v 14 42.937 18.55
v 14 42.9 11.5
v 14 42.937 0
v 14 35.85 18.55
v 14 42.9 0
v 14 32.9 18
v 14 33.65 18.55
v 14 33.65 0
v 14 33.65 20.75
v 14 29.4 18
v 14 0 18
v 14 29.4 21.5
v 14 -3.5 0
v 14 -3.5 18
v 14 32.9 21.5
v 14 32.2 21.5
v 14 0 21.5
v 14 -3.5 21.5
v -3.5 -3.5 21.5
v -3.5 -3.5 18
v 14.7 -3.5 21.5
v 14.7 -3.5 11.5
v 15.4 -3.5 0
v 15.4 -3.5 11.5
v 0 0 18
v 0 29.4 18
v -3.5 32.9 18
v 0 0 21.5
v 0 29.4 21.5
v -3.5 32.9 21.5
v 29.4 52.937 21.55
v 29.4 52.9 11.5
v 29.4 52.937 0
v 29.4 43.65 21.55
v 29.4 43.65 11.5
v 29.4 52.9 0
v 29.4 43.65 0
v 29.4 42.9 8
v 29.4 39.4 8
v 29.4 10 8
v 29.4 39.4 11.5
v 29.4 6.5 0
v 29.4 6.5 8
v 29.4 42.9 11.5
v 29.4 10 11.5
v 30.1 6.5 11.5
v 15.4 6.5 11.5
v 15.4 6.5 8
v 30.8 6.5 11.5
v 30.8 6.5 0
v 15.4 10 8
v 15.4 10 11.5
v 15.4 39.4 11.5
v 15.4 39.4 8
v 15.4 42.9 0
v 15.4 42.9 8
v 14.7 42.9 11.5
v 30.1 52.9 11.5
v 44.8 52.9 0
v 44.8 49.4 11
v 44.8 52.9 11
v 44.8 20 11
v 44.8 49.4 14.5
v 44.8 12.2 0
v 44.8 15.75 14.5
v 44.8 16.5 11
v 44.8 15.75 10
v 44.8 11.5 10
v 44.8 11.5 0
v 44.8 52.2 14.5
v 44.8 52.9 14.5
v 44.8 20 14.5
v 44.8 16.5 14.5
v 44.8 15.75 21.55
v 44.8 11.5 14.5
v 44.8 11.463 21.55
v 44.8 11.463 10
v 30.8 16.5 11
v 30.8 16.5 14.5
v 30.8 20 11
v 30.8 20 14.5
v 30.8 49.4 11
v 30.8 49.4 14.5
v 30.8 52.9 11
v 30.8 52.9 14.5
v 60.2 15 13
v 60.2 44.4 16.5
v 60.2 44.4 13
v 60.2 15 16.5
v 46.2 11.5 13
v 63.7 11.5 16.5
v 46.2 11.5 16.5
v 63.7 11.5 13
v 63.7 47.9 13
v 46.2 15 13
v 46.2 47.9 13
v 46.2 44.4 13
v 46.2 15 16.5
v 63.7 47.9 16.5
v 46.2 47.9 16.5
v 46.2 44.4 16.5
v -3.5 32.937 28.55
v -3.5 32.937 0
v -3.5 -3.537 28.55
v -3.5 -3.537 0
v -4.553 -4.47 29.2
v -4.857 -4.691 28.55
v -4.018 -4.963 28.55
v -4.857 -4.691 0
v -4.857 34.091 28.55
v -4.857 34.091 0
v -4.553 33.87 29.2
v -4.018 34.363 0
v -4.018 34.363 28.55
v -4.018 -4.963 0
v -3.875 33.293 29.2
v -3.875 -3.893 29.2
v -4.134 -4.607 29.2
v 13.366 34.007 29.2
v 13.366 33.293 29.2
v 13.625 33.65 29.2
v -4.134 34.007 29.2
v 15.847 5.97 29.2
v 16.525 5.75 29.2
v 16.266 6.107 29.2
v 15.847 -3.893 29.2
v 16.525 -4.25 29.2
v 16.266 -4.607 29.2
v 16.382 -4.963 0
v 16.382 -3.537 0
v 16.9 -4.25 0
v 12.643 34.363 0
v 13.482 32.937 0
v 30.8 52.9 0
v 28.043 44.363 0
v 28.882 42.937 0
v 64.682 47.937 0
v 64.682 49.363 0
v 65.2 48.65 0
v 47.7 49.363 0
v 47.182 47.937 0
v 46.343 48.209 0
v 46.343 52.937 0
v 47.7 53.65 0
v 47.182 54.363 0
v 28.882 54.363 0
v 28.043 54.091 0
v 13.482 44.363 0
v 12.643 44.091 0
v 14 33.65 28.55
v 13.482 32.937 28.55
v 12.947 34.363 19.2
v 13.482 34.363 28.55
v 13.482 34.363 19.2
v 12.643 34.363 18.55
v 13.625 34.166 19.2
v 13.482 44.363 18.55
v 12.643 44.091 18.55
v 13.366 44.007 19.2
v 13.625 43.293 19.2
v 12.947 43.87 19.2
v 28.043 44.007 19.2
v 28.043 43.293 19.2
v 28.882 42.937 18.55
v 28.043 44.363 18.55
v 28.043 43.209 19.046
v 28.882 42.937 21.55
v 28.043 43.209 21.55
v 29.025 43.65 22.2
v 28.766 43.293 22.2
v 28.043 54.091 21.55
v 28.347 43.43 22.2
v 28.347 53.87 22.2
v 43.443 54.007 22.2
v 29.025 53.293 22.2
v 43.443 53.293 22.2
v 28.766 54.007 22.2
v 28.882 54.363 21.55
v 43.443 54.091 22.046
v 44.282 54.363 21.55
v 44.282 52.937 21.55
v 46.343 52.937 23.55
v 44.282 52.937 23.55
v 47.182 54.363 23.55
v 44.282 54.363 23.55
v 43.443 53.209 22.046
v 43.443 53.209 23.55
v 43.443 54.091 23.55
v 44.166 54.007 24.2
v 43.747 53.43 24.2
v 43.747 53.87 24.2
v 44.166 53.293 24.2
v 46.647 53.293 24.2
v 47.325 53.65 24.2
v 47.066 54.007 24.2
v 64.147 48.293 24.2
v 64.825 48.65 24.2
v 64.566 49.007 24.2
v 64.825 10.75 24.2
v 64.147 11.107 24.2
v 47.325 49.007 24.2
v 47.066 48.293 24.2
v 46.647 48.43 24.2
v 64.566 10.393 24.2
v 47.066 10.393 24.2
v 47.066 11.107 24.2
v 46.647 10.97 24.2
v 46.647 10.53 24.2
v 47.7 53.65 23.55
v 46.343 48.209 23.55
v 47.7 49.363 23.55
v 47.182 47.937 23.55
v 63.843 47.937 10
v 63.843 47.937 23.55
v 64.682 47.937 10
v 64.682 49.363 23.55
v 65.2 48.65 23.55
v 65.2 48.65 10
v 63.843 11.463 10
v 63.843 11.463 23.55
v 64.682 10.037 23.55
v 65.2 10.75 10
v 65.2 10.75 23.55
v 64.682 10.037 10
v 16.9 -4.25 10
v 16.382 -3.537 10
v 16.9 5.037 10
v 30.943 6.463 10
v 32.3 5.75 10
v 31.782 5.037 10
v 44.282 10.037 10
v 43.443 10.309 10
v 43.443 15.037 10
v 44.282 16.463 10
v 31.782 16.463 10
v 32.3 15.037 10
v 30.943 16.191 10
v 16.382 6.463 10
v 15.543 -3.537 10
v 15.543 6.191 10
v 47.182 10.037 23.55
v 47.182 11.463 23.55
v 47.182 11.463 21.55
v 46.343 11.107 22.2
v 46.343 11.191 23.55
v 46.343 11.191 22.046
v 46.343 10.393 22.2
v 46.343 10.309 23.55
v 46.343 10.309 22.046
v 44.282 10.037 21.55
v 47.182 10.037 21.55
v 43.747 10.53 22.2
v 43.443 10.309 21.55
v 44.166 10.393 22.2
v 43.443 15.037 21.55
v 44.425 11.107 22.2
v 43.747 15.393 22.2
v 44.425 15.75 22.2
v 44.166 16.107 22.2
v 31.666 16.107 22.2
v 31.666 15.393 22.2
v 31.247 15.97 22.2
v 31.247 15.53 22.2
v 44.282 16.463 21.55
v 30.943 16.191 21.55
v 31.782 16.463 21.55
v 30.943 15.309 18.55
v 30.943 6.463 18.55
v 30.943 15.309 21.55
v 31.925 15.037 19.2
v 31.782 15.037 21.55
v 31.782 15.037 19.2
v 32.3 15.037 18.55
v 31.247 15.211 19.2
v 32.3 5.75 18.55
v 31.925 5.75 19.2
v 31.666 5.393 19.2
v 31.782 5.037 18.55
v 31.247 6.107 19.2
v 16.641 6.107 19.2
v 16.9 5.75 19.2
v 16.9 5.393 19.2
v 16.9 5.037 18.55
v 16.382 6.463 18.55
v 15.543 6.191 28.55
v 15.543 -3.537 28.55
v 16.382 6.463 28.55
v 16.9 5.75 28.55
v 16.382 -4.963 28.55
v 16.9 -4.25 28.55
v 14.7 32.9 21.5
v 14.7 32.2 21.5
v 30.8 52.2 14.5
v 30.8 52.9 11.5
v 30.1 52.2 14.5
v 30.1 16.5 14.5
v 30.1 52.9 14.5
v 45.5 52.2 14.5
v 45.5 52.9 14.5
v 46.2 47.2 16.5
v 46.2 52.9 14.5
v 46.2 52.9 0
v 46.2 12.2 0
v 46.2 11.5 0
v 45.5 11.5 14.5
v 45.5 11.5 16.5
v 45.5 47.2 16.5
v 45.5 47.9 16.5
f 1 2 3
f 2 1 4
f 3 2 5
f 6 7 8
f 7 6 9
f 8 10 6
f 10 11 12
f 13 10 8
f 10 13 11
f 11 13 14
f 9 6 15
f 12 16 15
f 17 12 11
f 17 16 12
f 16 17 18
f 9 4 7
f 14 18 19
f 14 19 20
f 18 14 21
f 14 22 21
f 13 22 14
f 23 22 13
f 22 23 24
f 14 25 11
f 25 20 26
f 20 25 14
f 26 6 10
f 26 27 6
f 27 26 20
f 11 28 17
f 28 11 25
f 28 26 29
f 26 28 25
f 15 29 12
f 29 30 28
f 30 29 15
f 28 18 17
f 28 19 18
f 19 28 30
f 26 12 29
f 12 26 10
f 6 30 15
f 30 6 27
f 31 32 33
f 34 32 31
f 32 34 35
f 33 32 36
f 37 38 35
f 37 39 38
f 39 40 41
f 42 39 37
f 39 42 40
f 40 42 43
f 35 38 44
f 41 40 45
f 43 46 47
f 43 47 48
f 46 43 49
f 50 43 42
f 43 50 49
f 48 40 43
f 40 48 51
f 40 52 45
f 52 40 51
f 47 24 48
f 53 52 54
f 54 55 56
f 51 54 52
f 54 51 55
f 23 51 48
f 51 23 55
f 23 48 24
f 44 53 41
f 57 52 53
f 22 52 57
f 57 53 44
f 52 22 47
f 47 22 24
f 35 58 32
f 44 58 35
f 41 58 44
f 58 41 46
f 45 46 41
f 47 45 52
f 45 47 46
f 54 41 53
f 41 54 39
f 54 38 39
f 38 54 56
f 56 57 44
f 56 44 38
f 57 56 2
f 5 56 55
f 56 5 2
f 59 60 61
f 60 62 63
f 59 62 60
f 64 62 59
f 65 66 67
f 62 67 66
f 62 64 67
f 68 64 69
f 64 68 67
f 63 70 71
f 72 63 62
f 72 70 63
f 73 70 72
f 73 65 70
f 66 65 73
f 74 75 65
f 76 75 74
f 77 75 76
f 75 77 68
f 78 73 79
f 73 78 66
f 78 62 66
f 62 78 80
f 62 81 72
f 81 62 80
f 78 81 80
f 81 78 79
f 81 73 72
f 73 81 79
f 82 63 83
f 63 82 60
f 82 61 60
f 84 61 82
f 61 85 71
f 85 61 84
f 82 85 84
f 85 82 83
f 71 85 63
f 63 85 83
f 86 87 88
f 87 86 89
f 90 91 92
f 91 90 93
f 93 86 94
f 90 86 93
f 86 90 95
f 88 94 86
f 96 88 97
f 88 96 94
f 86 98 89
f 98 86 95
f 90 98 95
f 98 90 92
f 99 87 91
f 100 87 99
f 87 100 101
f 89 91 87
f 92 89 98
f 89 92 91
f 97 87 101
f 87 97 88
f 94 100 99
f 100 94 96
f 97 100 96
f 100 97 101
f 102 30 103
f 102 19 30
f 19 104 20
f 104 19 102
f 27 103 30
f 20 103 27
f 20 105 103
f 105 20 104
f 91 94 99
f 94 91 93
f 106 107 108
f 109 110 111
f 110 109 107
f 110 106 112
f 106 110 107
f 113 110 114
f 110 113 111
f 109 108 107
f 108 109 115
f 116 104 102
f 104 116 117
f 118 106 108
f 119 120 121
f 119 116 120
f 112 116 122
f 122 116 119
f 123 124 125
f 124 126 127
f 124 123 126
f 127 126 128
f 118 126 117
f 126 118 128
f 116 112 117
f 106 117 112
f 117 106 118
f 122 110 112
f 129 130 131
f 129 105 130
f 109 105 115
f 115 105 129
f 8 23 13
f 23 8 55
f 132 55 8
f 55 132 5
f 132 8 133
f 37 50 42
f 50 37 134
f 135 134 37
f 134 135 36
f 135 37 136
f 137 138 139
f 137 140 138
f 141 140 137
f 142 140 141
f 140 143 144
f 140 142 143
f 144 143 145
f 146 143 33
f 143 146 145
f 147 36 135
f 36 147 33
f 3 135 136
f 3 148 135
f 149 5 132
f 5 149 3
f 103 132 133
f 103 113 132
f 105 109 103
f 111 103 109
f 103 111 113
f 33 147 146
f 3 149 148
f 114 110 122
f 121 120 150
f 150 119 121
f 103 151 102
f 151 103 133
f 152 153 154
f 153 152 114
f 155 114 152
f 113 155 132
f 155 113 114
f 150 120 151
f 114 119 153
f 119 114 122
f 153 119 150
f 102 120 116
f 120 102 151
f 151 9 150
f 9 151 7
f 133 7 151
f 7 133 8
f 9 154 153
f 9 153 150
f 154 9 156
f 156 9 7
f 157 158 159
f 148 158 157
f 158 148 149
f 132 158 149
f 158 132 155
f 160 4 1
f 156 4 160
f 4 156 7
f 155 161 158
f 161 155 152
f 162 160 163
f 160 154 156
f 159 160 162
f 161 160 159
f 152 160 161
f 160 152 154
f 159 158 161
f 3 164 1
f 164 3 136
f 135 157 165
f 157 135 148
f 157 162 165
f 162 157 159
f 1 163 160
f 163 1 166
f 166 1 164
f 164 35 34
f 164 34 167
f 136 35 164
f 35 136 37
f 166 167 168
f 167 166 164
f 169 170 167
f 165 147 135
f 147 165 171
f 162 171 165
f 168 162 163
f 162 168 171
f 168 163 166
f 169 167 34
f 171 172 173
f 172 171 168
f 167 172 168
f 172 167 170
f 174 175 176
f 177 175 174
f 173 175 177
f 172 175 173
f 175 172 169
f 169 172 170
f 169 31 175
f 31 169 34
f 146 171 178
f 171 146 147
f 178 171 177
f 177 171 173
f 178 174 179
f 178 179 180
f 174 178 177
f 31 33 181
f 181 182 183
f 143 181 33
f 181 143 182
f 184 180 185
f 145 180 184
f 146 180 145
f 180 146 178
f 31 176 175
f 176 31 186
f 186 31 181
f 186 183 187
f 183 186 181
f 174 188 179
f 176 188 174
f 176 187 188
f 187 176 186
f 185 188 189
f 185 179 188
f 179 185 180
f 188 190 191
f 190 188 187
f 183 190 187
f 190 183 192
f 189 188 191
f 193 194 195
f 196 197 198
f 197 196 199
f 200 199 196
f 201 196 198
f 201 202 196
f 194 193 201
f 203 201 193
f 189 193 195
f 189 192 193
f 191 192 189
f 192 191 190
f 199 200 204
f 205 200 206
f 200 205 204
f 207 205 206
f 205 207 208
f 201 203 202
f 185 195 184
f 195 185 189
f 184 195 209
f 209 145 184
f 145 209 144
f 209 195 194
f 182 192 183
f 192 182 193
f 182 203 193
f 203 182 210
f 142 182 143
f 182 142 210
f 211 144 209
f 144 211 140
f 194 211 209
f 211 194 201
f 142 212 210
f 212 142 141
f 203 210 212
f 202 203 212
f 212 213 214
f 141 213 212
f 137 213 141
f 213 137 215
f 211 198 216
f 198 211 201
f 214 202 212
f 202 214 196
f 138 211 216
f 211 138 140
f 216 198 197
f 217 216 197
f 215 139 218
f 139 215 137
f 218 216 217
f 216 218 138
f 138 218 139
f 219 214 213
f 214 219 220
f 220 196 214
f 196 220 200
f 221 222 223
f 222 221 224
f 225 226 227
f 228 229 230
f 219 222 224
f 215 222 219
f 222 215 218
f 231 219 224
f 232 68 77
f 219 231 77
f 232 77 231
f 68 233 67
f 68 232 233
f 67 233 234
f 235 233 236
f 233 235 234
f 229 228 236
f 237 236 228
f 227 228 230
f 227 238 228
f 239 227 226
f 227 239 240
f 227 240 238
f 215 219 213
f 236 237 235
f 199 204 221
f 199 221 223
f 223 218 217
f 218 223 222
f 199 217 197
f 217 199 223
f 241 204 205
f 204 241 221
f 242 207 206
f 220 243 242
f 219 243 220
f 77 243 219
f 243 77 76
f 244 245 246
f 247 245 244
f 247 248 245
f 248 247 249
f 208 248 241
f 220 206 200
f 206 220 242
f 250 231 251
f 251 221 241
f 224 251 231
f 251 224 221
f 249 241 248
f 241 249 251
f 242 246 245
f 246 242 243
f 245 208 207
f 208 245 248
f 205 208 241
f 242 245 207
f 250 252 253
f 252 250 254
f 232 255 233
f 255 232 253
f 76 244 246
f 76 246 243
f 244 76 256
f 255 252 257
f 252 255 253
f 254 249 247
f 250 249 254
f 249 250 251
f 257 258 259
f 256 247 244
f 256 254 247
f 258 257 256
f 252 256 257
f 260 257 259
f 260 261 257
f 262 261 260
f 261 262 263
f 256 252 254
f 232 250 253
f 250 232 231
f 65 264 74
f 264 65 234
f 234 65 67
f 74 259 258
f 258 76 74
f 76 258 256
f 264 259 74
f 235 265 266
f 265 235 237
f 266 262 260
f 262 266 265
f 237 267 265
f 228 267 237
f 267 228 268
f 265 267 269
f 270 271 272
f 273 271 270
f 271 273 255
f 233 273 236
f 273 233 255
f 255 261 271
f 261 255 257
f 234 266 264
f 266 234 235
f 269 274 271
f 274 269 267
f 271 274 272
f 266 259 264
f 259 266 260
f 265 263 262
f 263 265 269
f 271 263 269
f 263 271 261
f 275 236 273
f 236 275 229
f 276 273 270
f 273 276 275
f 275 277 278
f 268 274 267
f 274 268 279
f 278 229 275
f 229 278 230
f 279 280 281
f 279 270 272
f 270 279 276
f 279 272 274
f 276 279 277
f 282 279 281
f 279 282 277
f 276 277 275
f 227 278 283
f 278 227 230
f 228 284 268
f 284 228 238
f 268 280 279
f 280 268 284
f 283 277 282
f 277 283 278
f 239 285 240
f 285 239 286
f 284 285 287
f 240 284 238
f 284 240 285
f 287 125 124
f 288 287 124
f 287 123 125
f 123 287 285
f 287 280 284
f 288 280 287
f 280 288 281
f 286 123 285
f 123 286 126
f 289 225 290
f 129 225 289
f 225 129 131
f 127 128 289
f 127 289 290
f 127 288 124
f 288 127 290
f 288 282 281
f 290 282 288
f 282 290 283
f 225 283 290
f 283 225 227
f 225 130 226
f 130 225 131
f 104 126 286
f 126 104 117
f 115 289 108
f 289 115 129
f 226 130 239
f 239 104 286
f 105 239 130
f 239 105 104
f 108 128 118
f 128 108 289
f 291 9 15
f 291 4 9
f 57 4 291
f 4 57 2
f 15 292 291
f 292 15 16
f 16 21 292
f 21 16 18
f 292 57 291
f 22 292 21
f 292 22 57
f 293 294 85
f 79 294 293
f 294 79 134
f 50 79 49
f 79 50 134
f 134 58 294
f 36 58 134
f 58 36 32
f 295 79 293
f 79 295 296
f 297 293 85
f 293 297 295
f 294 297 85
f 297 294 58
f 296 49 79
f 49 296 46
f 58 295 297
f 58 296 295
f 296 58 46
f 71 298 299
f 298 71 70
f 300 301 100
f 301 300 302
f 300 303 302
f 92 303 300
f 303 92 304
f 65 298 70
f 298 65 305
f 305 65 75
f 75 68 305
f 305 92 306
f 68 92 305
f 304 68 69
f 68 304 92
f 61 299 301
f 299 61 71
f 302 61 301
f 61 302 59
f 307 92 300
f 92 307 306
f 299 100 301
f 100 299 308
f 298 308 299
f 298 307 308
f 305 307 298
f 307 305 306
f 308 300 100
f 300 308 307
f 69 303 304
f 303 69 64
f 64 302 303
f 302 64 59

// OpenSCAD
$fn=5;
union()
{
	union()
	{
		hull()
		{
			translate([-3.5,-3.5,18])
			{
				rotate(0,[0,0,1])
				{
					cube([3.5,3.5,3.5]);
				}
			}
			translate([-3.5,29.400002,18])
			{
				rotate(0,[0,0,1])
				{
					cube([3.5,3.5,3.5]);
				}
			}
		}
		union()
		{
			hull()
			{
				translate([0,-3.5,18])
				{
					rotate(0,[0,0,1])
					{
						cube([3.5,3.5,3.5]);
					}
				}
				translate([10.5,-3.5,18])
				{
					rotate(0,[0,0,1])
					{
						cube([3.5,3.5,3.5]);
					}
				}
			}
			hull()
			{
				translate([0,29.400002,18])
				{
					rotate(0,[0,0,1])
					{
						cube([3.5,3.5,3.5]);
					}
				}
				translate([10.5,29.400002,18])
				{
					rotate(0,[0,0,1])
					{
						cube([3.5,3.5,3.5]);
					}
				}
			}
		}
		union()
		{
			hull()
			{
				translate([15.4,6.5,8])
				{
					rotate(0,[0,0,1])
					{
						cube([3.5,3.5,3.5]);
					}
				}
				translate([25.9,6.5,8])
				{
					rotate(0,[0,0,1])
					{
						cube([3.5,3.5,3.5]);
					}
				}
			}
			hull()
			{
				translate([15.4,39.4,8])
				{
					rotate(0,[0,0,1])
					{
						cube([3.5,3.5,3.5]);
					}
				}
				translate([25.9,39.4,8])
				{
					rotate(0,[0,0,1])
					{
						cube([3.5,3.5,3.5]);
					}
				}
			}
		}
		union()
		{
			hull()
			{
				translate([30.8,16.5,11])
				{
					rotate(0,[0,0,1])
					{
						cube([3.5,3.5,3.5]);
					}
				}
				translate([41.3,16.5,11])
				{
					rotate(0,[0,0,1])
					{
						cube([3.5,3.5,3.5]);
					}
				}
			}
			hull()
			{
				translate([30.8,49.4,11])
				{
					rotate(0,[0,0,1])
					{
						cube([3.5,3.5,3.5]);
					}
				}
				translate([41.3,49.4,11])
				{
					rotate(0,[0,0,1])
					{
						cube([3.5,3.5,3.5]);
					}
				}
			}
		}
		union()
		{
			hull()
			{
				translate([46.199997,11.5,13])
				{
					rotate(0,[0,0,1])
					{
						cube([3.5,3.5,3.5]);
					}
				}
				translate([56.699997,11.5,13])
				{
					rotate(0,[0,0,1])
					{
						cube([3.5,3.5,3.5]);
					}
				}
			}
			hull()
			{
				translate([46.199997,44.4,13])
				{
					rotate(0,[0,0,1])
					{
						cube([3.5,3.5,3.5]);
					}
				}
				translate([56.699997,44.4,13])
				{
					rotate(0,[0,0,1])
					{
						cube([3.5,3.5,3.5]);
					}
				}
			}
		}
		hull()
		{
			translate([60.199997,11.5,13])
			{
				rotate(0,[0,0,1])
				{
					cube([3.5,3.5,3.5]);
				}
			}
			translate([60.199997,44.4,13])
			{
				rotate(0,[0,0,1])
				{
					cube([3.5,3.5,3.5]);
				}
			}
		}
	}
	union()
	{
		hull()
		{
			hull()
			{
				translate([-4.25,-4.25,0])
				{
					rotate(0,[0,0,1])
					{
						cylinder(h=1.5,d=1.5);
					}
				}
				translate([-4.25,-4.25,28.55])
				{
					rotate(0,[0,0,1])
					{
						sphere(d=1.5);
					}
				}
			}
			hull()
			{
				translate([-4.25,33.65,0])
				{
					rotate(0,[0,0,1])
					{
						cylinder(h=1.5,d=1.5);
					}
				}
				translate([-4.25,33.65,28.55])
				{
					rotate(0,[0,0,1])
					{
						sphere(d=1.5);
					}
				}
			}
		}
		hull()
		{
			hull()
			{
				translate([-4.25,33.65,0])
				{
					rotate(0,[0,0,1])
					{
						cylinder(h=1.5,d=1.5);
					}
				}
				translate([-4.25,33.65,28.55])
				{
					rotate(0,[0,0,1])
					{
						sphere(d=1.5);
					}
				}
			}
			hull()
			{
				translate([13.25,33.65,0])
				{
					rotate(0,[0,0,1])
					{
						cylinder(h=1.5,d=1.5);
					}
				}
				translate([13.25,33.65,28.55])
				{
					rotate(0,[0,0,1])
					{
						sphere(d=1.5);
					}
				}
			}
		}
		hull()
		{
			hull()
			{
				translate([13.25,33.65,0])
				{
					rotate(0,[0,0,1])
					{
						cylinder(h=1.5,d=1.5);
					}
				}
				translate([13.25,33.65,28.55])
				{
					rotate(0,[0,0,1])
					{
						sphere(d=1.5);
					}
				}
			}
			hull()
			{
				translate([13.25,33.65,0])
				{
					rotate(0,[0,0,1])
					{
						cylinder(h=1.5,d=1.5);
					}
				}
				translate([13.25,33.65,18.55])
				{
					rotate(0,[0,0,1])
					{
						sphere(d=1.5);
					}
				}
			}
		}
		hull()
		{
			hull()
			{
				translate([13.25,33.65,0])
				{
					rotate(0,[0,0,1])
					{
						cylinder(h=1.5,d=1.5);
					}
				}
				translate([13.25,33.65,18.55])
				{
					rotate(0,[0,0,1])
					{
						sphere(d=1.5);
					}
				}
			}
			hull()
			{
				translate([13.25,43.65,0])
				{
					rotate(0,[0,0,1])
					{
						cylinder(h=1.5,d=1.5);
					}
				}
				translate([13.25,43.65,18.55])
				{
					rotate(0,[0,0,1])
					{
						sphere(d=1.5);
					}
				}
			}
		}
		hull()
		{
			hull()
			{
				translate([13.25,43.65,0])
				{
					rotate(0,[0,0,1])
					{
						cylinder(h=1.5,d=1.5);
					}
				}
				translate([13.25,43.65,18.55])
				{
					rotate(0,[0,0,1])
					{
						sphere(d=1.5);
					}
				}
			}
			hull()
			{
				translate([16.15,43.65,0])
				{
					rotate(0,[0,0,1])
					{
						cylinder(h=1.5,d=1.5);
					}
				}
				translate([16.15,43.65,18.55])
				{
					rotate(0,[0,0,1])
					{
						sphere(d=1.5);
					}
				}
			}
		}
		hull()
		{
			hull()
			{
				translate([16.15,43.65,0])
				{
					rotate(0,[0,0,1])
					{
						cylinder(h=1.5,d=1.5);
					}
				}
				translate([16.15,43.65,18.55])
				{
					rotate(0,[0,0,1])
					{
						sphere(d=1.5);
					}
				}
			}
			hull()
			{
				translate([28.65,43.65,0])
				{
					rotate(0,[0,0,1])
					{
						cylinder(h=1.5,d=1.5);
					}
				}
				translate([28.65,43.65,18.55])
				{
					rotate(0,[0,0,1])
					{
						sphere(d=1.5);
					}
				}
			}
		}
		hull()
		{
			hull()
			{
				translate([28.65,43.65,0])
				{
					rotate(0,[0,0,1])
					{
						cylinder(h=1.5,d=1.5);
					}
				}
				translate([28.65,43.65,18.55])
				{
					rotate(0,[0,0,1])
					{
						sphere(d=1.5);
					}
				}
			}
			hull()
			{
				translate([28.65,43.65,0])
				{
					rotate(0,[0,0,1])
					{
						cylinder(h=1.5,d=1.5);
					}
				}
				translate([28.65,43.65,21.55])
				{
					rotate(0,[0,0,1])
					{
						sphere(d=1.5);
					}
				}
			}
		}
		hull()
		{
			hull()
			{
				translate([28.65,43.65,0])
				{
					rotate(0,[0,0,1])
					{
						cylinder(h=1.5,d=1.5);
					}
				}
				translate([28.65,43.65,21.55])
				{
					rotate(0,[0,0,1])
					{
						sphere(d=1.5);
					}
				}
			}
			hull()
			{
				translate([28.65,53.65,0])
				{
					rotate(0,[0,0,1])
					{
						cylinder(h=1.5,d=1.5);
					}
				}
				translate([28.65,53.65,21.55])
				{
					rotate(0,[0,0,1])
					{
						sphere(d=1.5);
					}
				}
			}
		}
		hull()
		{
			hull()
			{
				translate([28.65,53.65,0])
				{
					rotate(0,[0,0,1])
					{
						cylinder(h=1.5,d=1.5);
					}
				}
				translate([28.65,53.65,21.55])
				{
					rotate(0,[0,0,1])
					{
						sphere(d=1.5);
					}
				}
			}
			hull()
			{
				translate([31.55,53.65,0])
				{
					rotate(0,[0,0,1])
					{
						cylinder(h=1.5,d=1.5);
					}
				}
				translate([31.55,53.65,21.55])
				{
					rotate(0,[0,0,1])
					{
						sphere(d=1.5);
					}
				}
			}
		}
		hull()
		{
			hull()
			{
				translate([31.55,53.65,0])
				{
					rotate(0,[0,0,1])
					{
						cylinder(h=1.5,d=1.5);
					}
				}
				translate([31.55,53.65,21.55])
				{
					rotate(0,[0,0,1])
					{
						sphere(d=1.5);
					}
				}
			}
			hull()
			{
				translate([44.05,53.65,0])
				{
					rotate(0,[0,0,1])
					{
						cylinder(h=1.5,d=1.5);
					}
				}
				translate([44.05,53.65,21.55])
				{
					rotate(0,[0,0,1])
					{
						sphere(d=1.5);
					}
				}
			}
		}
		hull()
		{
			hull()
			{
				translate([44.05,53.65,0])
				{
					rotate(0,[0,0,1])
					{
						cylinder(h=1.5,d=1.5);
					}
				}
				translate([44.05,53.65,21.55])
				{
					rotate(0,[0,0,1])
					{
						sphere(d=1.5);
					}
				}
			}
			hull()
			{
				translate([44.05,53.65,0])
				{
					rotate(0,[0,0,1])
					{
						cylinder(h=1.5,d=1.5);
					}
				}
				translate([44.05,53.65,23.55])
				{
					rotate(0,[0,0,1])
					{
						sphere(d=1.5);
					}
				}
			}
		}
		hull()
		{
			hull()
			{
				translate([44.05,53.65,0])
				{
					rotate(0,[0,0,1])
					{
						cylinder(h=1.5,d=1.5);
					}
				}
				translate([44.05,53.65,23.55])
				{
					rotate(0,[0,0,1])
					{
						sphere(d=1.5);
					}
				}
			}
			hull()
			{
				translate([46.949997,53.65,0])
				{
					rotate(0,[0,0,1])
					{
						cylinder(h=1.5,d=1.5);
					}
				}
				translate([46.949997,53.65,23.55])
				{
					rotate(0,[0,0,1])
					{
						sphere(d=1.5);
					}
				}
			}
		}
		hull()
		{
			hull()
			{
				translate([46.949997,53.65,0])
				{
					rotate(0,[0,0,1])
					{
						cylinder(h=1.5,d=1.5);
					}
				}
				translate([46.949997,53.65,23.55])
				{
					rotate(0,[0,0,1])
					{
						sphere(d=1.5);
					}
				}
			}
			hull()
			{
				translate([46.949997,48.65,0])
				{
					rotate(0,[0,0,1])
					{
						cylinder(h=1.5,d=1.5);
					}
				}
				translate([46.949997,48.65,23.55])
				{
					rotate(0,[0,0,1])
					{
						sphere(d=1.5);
					}
				}
			}
		}
		hull()
		{
			hull()
			{
				translate([46.949997,48.65,0])
				{
					rotate(0,[0,0,1])
					{
						cylinder(h=1.5,d=1.5);
					}
				}
				translate([46.949997,48.65,23.55])
				{
					rotate(0,[0,0,1])
					{
						sphere(d=1.5);
					}
				}
			}
			hull()
			{
				translate([64.45,48.65,0])
				{
					rotate(0,[0,0,1])
					{
						cylinder(h=1.5,d=1.5);
					}
				}
				translate([64.45,48.65,23.55])
				{
					rotate(0,[0,0,1])
					{
						sphere(d=1.5);
					}
				}
			}
		}
		hull()
		{
			hull()
			{
				translate([64.45,48.65,0])
				{
					rotate(0,[0,0,1])
					{
						cylinder(h=1.5,d=1.5);
					}
				}
				translate([64.45,48.65,23.55])
				{
					rotate(0,[0,0,1])
					{
						sphere(d=1.5);
					}
				}
			}
			hull()
			{
				translate([64.45,48.65,10])
				{
					rotate(0,[0,0,1])
					{
						cylinder(h=1.5,d=1.5);
					}
				}
				translate([64.45,48.65,23.55])
				{
					rotate(0,[0,0,1])
					{
						sphere(d=1.5);
					}
				}
			}
		}
		hull()
		{
			hull()
			{
				translate([64.45,48.65,10])
				{
					rotate(0,[0,0,1])
					{
						cylinder(h=1.5,d=1.5);
					}
				}
				translate([64.45,48.65,23.55])
				{
					rotate(0,[0,0,1])
					{
						sphere(d=1.5);
					}
				}
			}
			hull()
			{
				translate([64.45,10.75,10])
				{
					rotate(0,[0,0,1])
					{
						cylinder(h=1.5,d=1.5);
					}
				}
				translate([64.45,10.75,23.55])
				{
					rotate(0,[0,0,1])
					{
						sphere(d=1.5);
					}
				}
			}
		}
		hull()
		{
			hull()
			{
				translate([64.45,10.75,10])
				{
					rotate(0,[0,0,1])
					{
						cylinder(h=1.5,d=1.5);
					}
				}
				translate([64.45,10.75,23.55])
				{
					rotate(0,[0,0,1])
					{
						sphere(d=1.5);
					}
				}
			}
			hull()
			{
				translate([46.949997,10.75,10])
				{
					rotate(0,[0,0,1])
					{
						cylinder(h=1.5,d=1.5);
					}
				}
				translate([46.949997,10.75,23.55])
				{
					rotate(0,[0,0,1])
					{
						sphere(d=1.5);
					}
				}
			}
		}
		hull()
		{
			hull()
			{
				translate([46.949997,10.75,10])
				{
					rotate(0,[0,0,1])
					{
						cylinder(h=1.5,d=1.5);
					}
				}
				translate([46.949997,10.75,23.55])
				{
					rotate(0,[0,0,1])
					{
						sphere(d=1.5);
					}
				}
			}
			hull()
			{
				translate([46.949997,10.75,10])
				{
					rotate(0,[0,0,1])
					{
						cylinder(h=1.5,d=1.5);
					}
				}
				translate([46.949997,10.75,21.55])
				{
					rotate(0,[0,0,1])
					{
						sphere(d=1.5);
					}
				}
			}
		}
		hull()
		{
			hull()
			{
				translate([46.949997,10.75,10])
				{
					rotate(0,[0,0,1])
					{
						cylinder(h=1.5,d=1.5);
					}
				}
				translate([46.949997,10.75,21.55])
				{
					rotate(0,[0,0,1])
					{
						sphere(d=1.5);
					}
				}
			}
			hull()
			{
				translate([44.05,10.75,10])
				{
					rotate(0,[0,0,1])
					{
						cylinder(h=1.5,d=1.5);
					}
				}
				translate([44.05,10.75,21.55])
				{
					rotate(0,[0,0,1])
					{
						sphere(d=1.5);
					}
				}
			}
		}
		hull()
		{
			hull()
			{
				translate([44.05,10.75,10])
				{
					rotate(0,[0,0,1])
					{
						cylinder(h=1.5,d=1.5);
					}
				}
				translate([44.05,10.75,21.55])
				{
					rotate(0,[0,0,1])
					{
						sphere(d=1.5);
					}
				}
			}
			hull()
			{
				translate([44.05,15.75,10])
				{
					rotate(0,[0,0,1])
					{
						cylinder(h=1.5,d=1.5);
					}
				}
				translate([44.05,15.75,21.55])
				{
					rotate(0,[0,0,1])
					{
						sphere(d=1.5);
					}
				}
			}
		}
		hull()
		{
			hull()
			{
				translate([44.05,15.75,10])
				{
					rotate(0,[0,0,1])
					{
						cylinder(h=1.5,d=1.5);
					}
				}
				translate([44.05,15.75,21.55])
				{
					rotate(0,[0,0,1])
					{
						sphere(d=1.5);
					}
				}
			}
			hull()
			{
				translate([31.55,15.75,10])
				{
					rotate(0,[0,0,1])
					{
						cylinder(h=1.5,d=1.5);
					}
				}
				translate([31.55,15.75,21.55])
				{
					rotate(0,[0,0,1])
					{
						sphere(d=1.5);
					}
				}
			}
		}
		hull()
		{
			hull()
			{
				translate([31.55,15.75,10])
				{
					rotate(0,[0,0,1])
					{
						cylinder(h=1.5,d=1.5);
					}
				}
				translate([31.55,15.75,21.55])
				{
					rotate(0,[0,0,1])
					{
						sphere(d=1.5);
					}
				}
			}
			hull()
			{
				translate([31.55,15.75,10])
				{
					rotate(0,[0,0,1])
					{
						cylinder(h=1.5,d=1.5);
					}
				}
				translate([31.55,15.75,18.55])
				{
					rotate(0,[0,0,1])
					{
						sphere(d=1.5);
					}
				}
			}
		}
		hull()
		{
			hull()
			{
				translate([31.55,15.75,10])
				{
					rotate(0,[0,0,1])
					{
						cylinder(h=1.5,d=1.5);
					}
				}
				translate([31.55,15.75,18.55])
				{
					rotate(0,[0,0,1])
					{
						sphere(d=1.5);
					}
				}
			}
			hull()
			{
				translate([31.55,5.75,10])
				{
					rotate(0,[0,0,1])
					{
						cylinder(h=1.5,d=1.5);
					}
				}
				translate([31.55,5.75,18.55])
				{
					rotate(0,[0,0,1])
					{
						sphere(d=1.5);
					}
				}
			}
		}
		hull()
		{
			hull()
			{
				translate([31.55,5.75,10])
				{
					rotate(0,[0,0,1])
					{
						cylinder(h=1.5,d=1.5);
					}
				}
				translate([31.55,5.75,18.55])
				{
					rotate(0,[0,0,1])
					{
						sphere(d=1.5);
					}
				}
			}
			hull()
			{
				translate([28.65,5.75,10])
				{
					rotate(0,[0,0,1])
					{
						cylinder(h=1.5,d=1.5);
					}
				}
				translate([28.65,5.75,18.55])
				{
					rotate(0,[0,0,1])
					{
						sphere(d=1.5);
					}
				}
			}
		}
		hull()
		{
			hull()
			{
				translate([28.65,5.75,10])
				{
					rotate(0,[0,0,1])
					{
						cylinder(h=1.5,d=1.5);
					}
				}
				translate([28.65,5.75,18.55])
				{
					rotate(0,[0,0,1])
					{
						sphere(d=1.5);
					}
				}
			}
			hull()
			{
				translate([16.15,5.75,10])
				{
					rotate(0,[0,0,1])
					{
						cylinder(h=1.5,d=1.5);
					}
				}
				translate([16.15,5.75,18.55])
				{
					rotate(0,[0,0,1])
					{
						sphere(d=1.5);
					}
				}
			}
		}
		hull()
		{
			hull()
			{
				translate([16.15,5.75,10])
				{
					rotate(0,[0,0,1])
					{
						cylinder(h=1.5,d=1.5);
					}
				}
				translate([16.15,5.75,18.55])
				{
					rotate(0,[0,0,1])
					{
						sphere(d=1.5);
					}
				}
			}
			hull()
			{
				translate([16.15,5.75,10])
				{
					rotate(0,[0,0,1])
					{
						cylinder(h=1.5,d=1.5);
					}
				}
				translate([16.15,5.75,28.55])
				{
					rotate(0,[0,0,1])
					{
						sphere(d=1.5);
					}
				}
			}
		}
		hull()
		{
			hull()
			{
				translate([16.15,5.75,10])
				{
					rotate(0,[0,0,1])
					{
						cylinder(h=1.5,d=1.5);
					}
				}
				translate([16.15,5.75,28.55])
				{
					rotate(0,[0,0,1])
					{
						sphere(d=1.5);
					}
				}
			}
			hull()
			{
				translate([16.15,-4.25,10])
				{
					rotate(0,[0,0,1])
					{
						cylinder(h=1.5,d=1.5);
					}
				}
				translate([16.15,-4.25,28.55])
				{
					rotate(0,[0,0,1])
					{
						sphere(d=1.5);
					}
				}
			}
		}
		hull()
		{
			hull()
			{
				translate([16.15,-4.25,10])
				{
					rotate(0,[0,0,1])
					{
						cylinder(h=1.5,d=1.5);
					}
				}
				translate([16.15,-4.25,28.55])
				{
					rotate(0,[0,0,1])
					{
						sphere(d=1.5);
					}
				}
			}
			hull()
			{
				translate([16.15,-4.25,0])
				{
					rotate(0,[0,0,1])
					{
						cylinder(h=1.5,d=1.5);
					}
				}
				translate([16.15,-4.25,28.55])
				{
					rotate(0,[0,0,1])
					{
						sphere(d=1.5);
					}
				}
			}
		}
		hull()
		{
			hull()
			{
				translate([16.15,-4.25,0])
				{
					rotate(0,[0,0,1])
					{
						cylinder(h=1.5,d=1.5);
					}
				}
				translate([16.15,-4.25,28.55])
				{
					rotate(0,[0,0,1])
					{
						sphere(d=1.5);
					}
				}
			}
			hull()
			{
				translate([13.25,-4.25,0])
				{
					rotate(0,[0,0,1])
					{
						cylinder(h=1.5,d=1.5);
					}
				}
				translate([13.25,-4.25,28.55])
				{
					rotate(0,[0,0,1])
					{
						sphere(d=1.5);
					}
				}
			}
		}
		hull()
		{
			hull()
			{
				translate([13.25,-4.25,0])
				{
					rotate(0,[0,0,1])
					{
						cylinder(h=1.5,d=1.5);
					}
				}
				translate([13.25,-4.25,28.55])
				{
					rotate(0,[0,0,1])
					{
						sphere(d=1.5);
					}
				}
			}
			hull()
			{
				translate([-4.25,-4.25,0])
				{
					rotate(0,[0,0,1])
					{
						cylinder(h=1.5,d=1.5);
					}
				}
				translate([-4.25,-4.25,28.55])
				{
					rotate(0,[0,0,1])
					{
						sphere(d=1.5);
					}
				}
			}
		}
	}
	union()
	{
		union()
		{
			union()
			{
				hull()
				{
					hull()
					{
						translate([14,-3.5,21.5])
						{
							rotate(90,[-1,0,0])
							{
								cube([0.6999998,0.6999998,0.6999998]);
							}
						}
						translate([14,32.199997,21.500004])
						{
							rotate(90,[-1,0,0])
							{
								cube([0.6999998,0.6999998,0.6999998]);
							}
						}
					}
					hull()
					{
						translate([14,-3.5,11.5])
						{
							rotate(90,[-1,0,0])
							{
								cube([0.6999998,0.6999998,0.6999998]);
							}
						}
						translate([14,42.2,11.5])
						{
							rotate(90,[-1,0,0])
							{
								cube([0.6999998,0.6999998,0.6999998]);
							}
						}
					}
				}
				hull()
				{
					hull()
					{
						translate([14,-3.5,11.5])
						{
							rotate(90,[-1,0,0])
							{
								cube([0.6999998,0.6999998,0.6999998]);
							}
						}
						translate([14,42.2,11.5])
						{
							rotate(90,[-1,0,0])
							{
								cube([0.6999998,0.6999998,0.6999998]);
							}
						}
					}
					hull()
					{
						translate([14.7,-3.5,11.5])
						{
							rotate(90,[-1,0,0])
							{
								cube([0.6999998,0.6999998,0.6999998]);
							}
						}
						translate([14.7,42.2,11.5])
						{
							rotate(90,[-1,0,0])
							{
								cube([0.6999998,0.6999998,0.6999998]);
							}
						}
					}
				}
			}
			hull()
			{
				hull()
				{
					translate([14,-3.5,0.6999998])
					{
						rotate(90,[-1,0,0])
						{
							cube([0.6999998,0.6999998,0.6999998]);
						}
					}
					translate([14,42.2,0.6999998])
					{
						rotate(90,[-1,0,0])
						{
							cube([0.6999998,0.6999998,0.6999998]);
						}
					}
				}
				hull()
				{
					translate([14.7,-3.5,0.6999998])
					{
						rotate(90,[-1,0,0])
						{
							cube([0.6999998,0.6999998,0.6999998]);
						}
					}
					translate([14.7,42.2,0.6999998])
					{
						rotate(90,[-1,0,0])
						{
							cube([0.6999998,0.6999998,0.6999998]);
						}
					}
				}
				hull()
				{
					translate([14,-3.5,11.5])
					{
						rotate(90,[-1,0,0])
						{
							cube([0.6999998,0.6999998,0.6999998]);
						}
					}
					translate([14,42.2,11.5])
					{
						rotate(90,[-1,0,0])
						{
							cube([0.6999998,0.6999998,0.6999998]);
						}
					}
				}
				hull()
				{
					translate([14.7,-3.5,11.5])
					{
						rotate(90,[-1,0,0])
						{
							cube([0.6999998,0.6999998,0.6999998]);
						}
					}
					translate([14.7,42.2,11.5])
					{
						rotate(90,[-1,0,0])
						{
							cube([0.6999998,0.6999998,0.6999998]);
						}
					}
				}
			}
		}
		union()
		{
			union()
			{
				hull()
				{
					hull()
					{
						translate([29.4,6.5,11.5])
						{
							rotate(90,[-1,0,0])
							{
								cube([0.6999998,0.6999998,0.6999998]);
							}
						}
						translate([29.4,52.2,11.5])
						{
							rotate(90,[-1,0,0])
							{
								cube([0.6999998,0.6999998,0.6999998]);
							}
						}
					}
					hull()
					{
						translate([30.099998,6.5,11.5])
						{
							rotate(90,[-1,0,0])
							{
								cube([0.6999998,0.6999998,0.6999998]);
							}
						}
						translate([30.099998,52.2,11.5])
						{
							rotate(90,[-1,0,0])
							{
								cube([0.6999998,0.6999998,0.6999998]);
							}
						}
					}
				}
				hull()
				{
					hull()
					{
						translate([30.099998,6.5,11.5])
						{
							rotate(90,[-1,0,0])
							{
								cube([0.6999998,0.6999998,0.6999998]);
							}
						}
						translate([30.099998,52.2,11.5])
						{
							rotate(90,[-1,0,0])
							{
								cube([0.6999998,0.6999998,0.6999998]);
							}
						}
					}
					hull()
					{
						translate([30.099998,16.5,14.5])
						{
							rotate(90,[-1,0,0])
							{
								cube([0.6999998,0.6999998,0.6999998]);
							}
						}
						translate([30.099998,52.199997,14.500004])
						{
							rotate(90,[-1,0,0])
							{
								cube([0.6999998,0.6999998,0.6999998]);
							}
						}
					}
				}
			}
			hull()
			{
				hull()
				{
					translate([29.4,6.5,0.6999998])
					{
						rotate(90,[-1,0,0])
						{
							cube([0.6999998,0.6999998,0.6999998]);
						}
					}
					translate([29.4,52.2,0.6999998])
					{
						rotate(90,[-1,0,0])
						{
							cube([0.6999998,0.6999998,0.6999998]);
						}
					}
				}
				hull()
				{
					translate([30.099998,6.5,0.6999998])
					{
						rotate(90,[-1,0,0])
						{
							cube([0.6999998,0.6999998,0.6999998]);
						}
					}
					translate([30.099998,52.2,0.6999998])
					{
						rotate(90,[-1,0,0])
						{
							cube([0.6999998,0.6999998,0.6999998]);
						}
					}
				}
				hull()
				{
					translate([29.4,6.5,11.5])
					{
						rotate(90,[-1,0,0])
						{
							cube([0.6999998,0.6999998,0.6999998]);
						}
					}
					translate([29.4,52.2,11.5])
					{
						rotate(90,[-1,0,0])
						{
							cube([0.6999998,0.6999998,0.6999998]);
						}
					}
				}
				hull()
				{
					translate([30.099998,6.5,11.5])
					{
						rotate(90,[-1,0,0])
						{
							cube([0.6999998,0.6999998,0.6999998]);
						}
					}
					translate([30.099998,52.2,11.5])
					{
						rotate(90,[-1,0,0])
						{
							cube([0.6999998,0.6999998,0.6999998]);
						}
					}
				}
			}
		}
		union()
		{
			union()
			{
				hull()
				{
					hull()
					{
						translate([44.8,11.5,14.5])
						{
							rotate(90,[-1,0,0])
							{
								cube([0.6999998,0.6999998,0.6999998]);
							}
						}
						translate([44.8,52.199997,14.500004])
						{
							rotate(90,[-1,0,0])
							{
								cube([0.6999998,0.6999998,0.6999998]);
							}
						}
					}
					hull()
					{
						translate([45.499996,11.5,14.5])
						{
							rotate(90,[-1,0,0])
							{
								cube([0.6999998,0.6999998,0.6999998]);
							}
						}
						translate([45.499996,52.199997,14.500004])
						{
							rotate(90,[-1,0,0])
							{
								cube([0.6999998,0.6999998,0.6999998]);
							}
						}
					}
				}
				hull()
				{
					hull()
					{
						translate([45.499996,11.5,14.5])
						{
							rotate(90,[-1,0,0])
							{
								cube([0.6999998,0.6999998,0.6999998]);
							}
						}
						translate([45.499996,52.199997,14.500004])
						{
							rotate(90,[-1,0,0])
							{
								cube([0.6999998,0.6999998,0.6999998]);
							}
						}
					}
					hull()
					{
						translate([45.499996,11.5,16.5])
						{
							rotate(90,[-1,0,0])
							{
								cube([0.6999998,0.6999998,0.6999998]);
							}
						}
						translate([45.499996,47.199997,16.500004])
						{
							rotate(90,[-1,0,0])
							{
								cube([0.6999998,0.6999998,0.6999998]);
							}
						}
					}
				}
			}
			hull()
			{
				hull()
				{
					translate([44.8,11.5,0.6999998])
					{
						rotate(90,[-1,0,0])
						{
							cube([0.6999998,0.6999998,0.6999998]);
						}
					}
					translate([44.8,52.199997,0.7000036])
					{
						rotate(90,[-1,0,0])
						{
							cube([0.6999998,0.6999998,0.6999998]);
						}
					}
				}
				hull()
				{
					translate([45.499996,11.5,0.6999998])
					{
						rotate(90,[-1,0,0])
						{
							cube([0.6999998,0.6999998,0.6999998]);
						}
					}
					translate([45.499996,52.199997,0.7000036])
					{
						rotate(90,[-1,0,0])
						{
							cube([0.6999998,0.6999998,0.6999998]);
						}
					}
				}
				hull()
				{
					translate([44.8,11.5,14.5])
					{
						rotate(90,[-1,0,0])
						{
							cube([0.6999998,0.6999998,0.6999998]);
						}
					}
					translate([44.8,52.199997,14.500004])
					{
						rotate(90,[-1,0,0])
						{
							cube([0.6999998,0.6999998,0.6999998]);
						}
					}
				}
				hull()
				{
					translate([45.499996,11.5,14.5])
					{
						rotate(90,[-1,0,0])
						{
							cube([0.6999998,0.6999998,0.6999998]);
						}
					}
					translate([45.499996,52.199997,14.500004])
					{
						rotate(90,[-1,0,0])
						{
							cube([0.6999998,0.6999998,0.6999998]);
						}
					}
				}
			}
		}
	}
}
